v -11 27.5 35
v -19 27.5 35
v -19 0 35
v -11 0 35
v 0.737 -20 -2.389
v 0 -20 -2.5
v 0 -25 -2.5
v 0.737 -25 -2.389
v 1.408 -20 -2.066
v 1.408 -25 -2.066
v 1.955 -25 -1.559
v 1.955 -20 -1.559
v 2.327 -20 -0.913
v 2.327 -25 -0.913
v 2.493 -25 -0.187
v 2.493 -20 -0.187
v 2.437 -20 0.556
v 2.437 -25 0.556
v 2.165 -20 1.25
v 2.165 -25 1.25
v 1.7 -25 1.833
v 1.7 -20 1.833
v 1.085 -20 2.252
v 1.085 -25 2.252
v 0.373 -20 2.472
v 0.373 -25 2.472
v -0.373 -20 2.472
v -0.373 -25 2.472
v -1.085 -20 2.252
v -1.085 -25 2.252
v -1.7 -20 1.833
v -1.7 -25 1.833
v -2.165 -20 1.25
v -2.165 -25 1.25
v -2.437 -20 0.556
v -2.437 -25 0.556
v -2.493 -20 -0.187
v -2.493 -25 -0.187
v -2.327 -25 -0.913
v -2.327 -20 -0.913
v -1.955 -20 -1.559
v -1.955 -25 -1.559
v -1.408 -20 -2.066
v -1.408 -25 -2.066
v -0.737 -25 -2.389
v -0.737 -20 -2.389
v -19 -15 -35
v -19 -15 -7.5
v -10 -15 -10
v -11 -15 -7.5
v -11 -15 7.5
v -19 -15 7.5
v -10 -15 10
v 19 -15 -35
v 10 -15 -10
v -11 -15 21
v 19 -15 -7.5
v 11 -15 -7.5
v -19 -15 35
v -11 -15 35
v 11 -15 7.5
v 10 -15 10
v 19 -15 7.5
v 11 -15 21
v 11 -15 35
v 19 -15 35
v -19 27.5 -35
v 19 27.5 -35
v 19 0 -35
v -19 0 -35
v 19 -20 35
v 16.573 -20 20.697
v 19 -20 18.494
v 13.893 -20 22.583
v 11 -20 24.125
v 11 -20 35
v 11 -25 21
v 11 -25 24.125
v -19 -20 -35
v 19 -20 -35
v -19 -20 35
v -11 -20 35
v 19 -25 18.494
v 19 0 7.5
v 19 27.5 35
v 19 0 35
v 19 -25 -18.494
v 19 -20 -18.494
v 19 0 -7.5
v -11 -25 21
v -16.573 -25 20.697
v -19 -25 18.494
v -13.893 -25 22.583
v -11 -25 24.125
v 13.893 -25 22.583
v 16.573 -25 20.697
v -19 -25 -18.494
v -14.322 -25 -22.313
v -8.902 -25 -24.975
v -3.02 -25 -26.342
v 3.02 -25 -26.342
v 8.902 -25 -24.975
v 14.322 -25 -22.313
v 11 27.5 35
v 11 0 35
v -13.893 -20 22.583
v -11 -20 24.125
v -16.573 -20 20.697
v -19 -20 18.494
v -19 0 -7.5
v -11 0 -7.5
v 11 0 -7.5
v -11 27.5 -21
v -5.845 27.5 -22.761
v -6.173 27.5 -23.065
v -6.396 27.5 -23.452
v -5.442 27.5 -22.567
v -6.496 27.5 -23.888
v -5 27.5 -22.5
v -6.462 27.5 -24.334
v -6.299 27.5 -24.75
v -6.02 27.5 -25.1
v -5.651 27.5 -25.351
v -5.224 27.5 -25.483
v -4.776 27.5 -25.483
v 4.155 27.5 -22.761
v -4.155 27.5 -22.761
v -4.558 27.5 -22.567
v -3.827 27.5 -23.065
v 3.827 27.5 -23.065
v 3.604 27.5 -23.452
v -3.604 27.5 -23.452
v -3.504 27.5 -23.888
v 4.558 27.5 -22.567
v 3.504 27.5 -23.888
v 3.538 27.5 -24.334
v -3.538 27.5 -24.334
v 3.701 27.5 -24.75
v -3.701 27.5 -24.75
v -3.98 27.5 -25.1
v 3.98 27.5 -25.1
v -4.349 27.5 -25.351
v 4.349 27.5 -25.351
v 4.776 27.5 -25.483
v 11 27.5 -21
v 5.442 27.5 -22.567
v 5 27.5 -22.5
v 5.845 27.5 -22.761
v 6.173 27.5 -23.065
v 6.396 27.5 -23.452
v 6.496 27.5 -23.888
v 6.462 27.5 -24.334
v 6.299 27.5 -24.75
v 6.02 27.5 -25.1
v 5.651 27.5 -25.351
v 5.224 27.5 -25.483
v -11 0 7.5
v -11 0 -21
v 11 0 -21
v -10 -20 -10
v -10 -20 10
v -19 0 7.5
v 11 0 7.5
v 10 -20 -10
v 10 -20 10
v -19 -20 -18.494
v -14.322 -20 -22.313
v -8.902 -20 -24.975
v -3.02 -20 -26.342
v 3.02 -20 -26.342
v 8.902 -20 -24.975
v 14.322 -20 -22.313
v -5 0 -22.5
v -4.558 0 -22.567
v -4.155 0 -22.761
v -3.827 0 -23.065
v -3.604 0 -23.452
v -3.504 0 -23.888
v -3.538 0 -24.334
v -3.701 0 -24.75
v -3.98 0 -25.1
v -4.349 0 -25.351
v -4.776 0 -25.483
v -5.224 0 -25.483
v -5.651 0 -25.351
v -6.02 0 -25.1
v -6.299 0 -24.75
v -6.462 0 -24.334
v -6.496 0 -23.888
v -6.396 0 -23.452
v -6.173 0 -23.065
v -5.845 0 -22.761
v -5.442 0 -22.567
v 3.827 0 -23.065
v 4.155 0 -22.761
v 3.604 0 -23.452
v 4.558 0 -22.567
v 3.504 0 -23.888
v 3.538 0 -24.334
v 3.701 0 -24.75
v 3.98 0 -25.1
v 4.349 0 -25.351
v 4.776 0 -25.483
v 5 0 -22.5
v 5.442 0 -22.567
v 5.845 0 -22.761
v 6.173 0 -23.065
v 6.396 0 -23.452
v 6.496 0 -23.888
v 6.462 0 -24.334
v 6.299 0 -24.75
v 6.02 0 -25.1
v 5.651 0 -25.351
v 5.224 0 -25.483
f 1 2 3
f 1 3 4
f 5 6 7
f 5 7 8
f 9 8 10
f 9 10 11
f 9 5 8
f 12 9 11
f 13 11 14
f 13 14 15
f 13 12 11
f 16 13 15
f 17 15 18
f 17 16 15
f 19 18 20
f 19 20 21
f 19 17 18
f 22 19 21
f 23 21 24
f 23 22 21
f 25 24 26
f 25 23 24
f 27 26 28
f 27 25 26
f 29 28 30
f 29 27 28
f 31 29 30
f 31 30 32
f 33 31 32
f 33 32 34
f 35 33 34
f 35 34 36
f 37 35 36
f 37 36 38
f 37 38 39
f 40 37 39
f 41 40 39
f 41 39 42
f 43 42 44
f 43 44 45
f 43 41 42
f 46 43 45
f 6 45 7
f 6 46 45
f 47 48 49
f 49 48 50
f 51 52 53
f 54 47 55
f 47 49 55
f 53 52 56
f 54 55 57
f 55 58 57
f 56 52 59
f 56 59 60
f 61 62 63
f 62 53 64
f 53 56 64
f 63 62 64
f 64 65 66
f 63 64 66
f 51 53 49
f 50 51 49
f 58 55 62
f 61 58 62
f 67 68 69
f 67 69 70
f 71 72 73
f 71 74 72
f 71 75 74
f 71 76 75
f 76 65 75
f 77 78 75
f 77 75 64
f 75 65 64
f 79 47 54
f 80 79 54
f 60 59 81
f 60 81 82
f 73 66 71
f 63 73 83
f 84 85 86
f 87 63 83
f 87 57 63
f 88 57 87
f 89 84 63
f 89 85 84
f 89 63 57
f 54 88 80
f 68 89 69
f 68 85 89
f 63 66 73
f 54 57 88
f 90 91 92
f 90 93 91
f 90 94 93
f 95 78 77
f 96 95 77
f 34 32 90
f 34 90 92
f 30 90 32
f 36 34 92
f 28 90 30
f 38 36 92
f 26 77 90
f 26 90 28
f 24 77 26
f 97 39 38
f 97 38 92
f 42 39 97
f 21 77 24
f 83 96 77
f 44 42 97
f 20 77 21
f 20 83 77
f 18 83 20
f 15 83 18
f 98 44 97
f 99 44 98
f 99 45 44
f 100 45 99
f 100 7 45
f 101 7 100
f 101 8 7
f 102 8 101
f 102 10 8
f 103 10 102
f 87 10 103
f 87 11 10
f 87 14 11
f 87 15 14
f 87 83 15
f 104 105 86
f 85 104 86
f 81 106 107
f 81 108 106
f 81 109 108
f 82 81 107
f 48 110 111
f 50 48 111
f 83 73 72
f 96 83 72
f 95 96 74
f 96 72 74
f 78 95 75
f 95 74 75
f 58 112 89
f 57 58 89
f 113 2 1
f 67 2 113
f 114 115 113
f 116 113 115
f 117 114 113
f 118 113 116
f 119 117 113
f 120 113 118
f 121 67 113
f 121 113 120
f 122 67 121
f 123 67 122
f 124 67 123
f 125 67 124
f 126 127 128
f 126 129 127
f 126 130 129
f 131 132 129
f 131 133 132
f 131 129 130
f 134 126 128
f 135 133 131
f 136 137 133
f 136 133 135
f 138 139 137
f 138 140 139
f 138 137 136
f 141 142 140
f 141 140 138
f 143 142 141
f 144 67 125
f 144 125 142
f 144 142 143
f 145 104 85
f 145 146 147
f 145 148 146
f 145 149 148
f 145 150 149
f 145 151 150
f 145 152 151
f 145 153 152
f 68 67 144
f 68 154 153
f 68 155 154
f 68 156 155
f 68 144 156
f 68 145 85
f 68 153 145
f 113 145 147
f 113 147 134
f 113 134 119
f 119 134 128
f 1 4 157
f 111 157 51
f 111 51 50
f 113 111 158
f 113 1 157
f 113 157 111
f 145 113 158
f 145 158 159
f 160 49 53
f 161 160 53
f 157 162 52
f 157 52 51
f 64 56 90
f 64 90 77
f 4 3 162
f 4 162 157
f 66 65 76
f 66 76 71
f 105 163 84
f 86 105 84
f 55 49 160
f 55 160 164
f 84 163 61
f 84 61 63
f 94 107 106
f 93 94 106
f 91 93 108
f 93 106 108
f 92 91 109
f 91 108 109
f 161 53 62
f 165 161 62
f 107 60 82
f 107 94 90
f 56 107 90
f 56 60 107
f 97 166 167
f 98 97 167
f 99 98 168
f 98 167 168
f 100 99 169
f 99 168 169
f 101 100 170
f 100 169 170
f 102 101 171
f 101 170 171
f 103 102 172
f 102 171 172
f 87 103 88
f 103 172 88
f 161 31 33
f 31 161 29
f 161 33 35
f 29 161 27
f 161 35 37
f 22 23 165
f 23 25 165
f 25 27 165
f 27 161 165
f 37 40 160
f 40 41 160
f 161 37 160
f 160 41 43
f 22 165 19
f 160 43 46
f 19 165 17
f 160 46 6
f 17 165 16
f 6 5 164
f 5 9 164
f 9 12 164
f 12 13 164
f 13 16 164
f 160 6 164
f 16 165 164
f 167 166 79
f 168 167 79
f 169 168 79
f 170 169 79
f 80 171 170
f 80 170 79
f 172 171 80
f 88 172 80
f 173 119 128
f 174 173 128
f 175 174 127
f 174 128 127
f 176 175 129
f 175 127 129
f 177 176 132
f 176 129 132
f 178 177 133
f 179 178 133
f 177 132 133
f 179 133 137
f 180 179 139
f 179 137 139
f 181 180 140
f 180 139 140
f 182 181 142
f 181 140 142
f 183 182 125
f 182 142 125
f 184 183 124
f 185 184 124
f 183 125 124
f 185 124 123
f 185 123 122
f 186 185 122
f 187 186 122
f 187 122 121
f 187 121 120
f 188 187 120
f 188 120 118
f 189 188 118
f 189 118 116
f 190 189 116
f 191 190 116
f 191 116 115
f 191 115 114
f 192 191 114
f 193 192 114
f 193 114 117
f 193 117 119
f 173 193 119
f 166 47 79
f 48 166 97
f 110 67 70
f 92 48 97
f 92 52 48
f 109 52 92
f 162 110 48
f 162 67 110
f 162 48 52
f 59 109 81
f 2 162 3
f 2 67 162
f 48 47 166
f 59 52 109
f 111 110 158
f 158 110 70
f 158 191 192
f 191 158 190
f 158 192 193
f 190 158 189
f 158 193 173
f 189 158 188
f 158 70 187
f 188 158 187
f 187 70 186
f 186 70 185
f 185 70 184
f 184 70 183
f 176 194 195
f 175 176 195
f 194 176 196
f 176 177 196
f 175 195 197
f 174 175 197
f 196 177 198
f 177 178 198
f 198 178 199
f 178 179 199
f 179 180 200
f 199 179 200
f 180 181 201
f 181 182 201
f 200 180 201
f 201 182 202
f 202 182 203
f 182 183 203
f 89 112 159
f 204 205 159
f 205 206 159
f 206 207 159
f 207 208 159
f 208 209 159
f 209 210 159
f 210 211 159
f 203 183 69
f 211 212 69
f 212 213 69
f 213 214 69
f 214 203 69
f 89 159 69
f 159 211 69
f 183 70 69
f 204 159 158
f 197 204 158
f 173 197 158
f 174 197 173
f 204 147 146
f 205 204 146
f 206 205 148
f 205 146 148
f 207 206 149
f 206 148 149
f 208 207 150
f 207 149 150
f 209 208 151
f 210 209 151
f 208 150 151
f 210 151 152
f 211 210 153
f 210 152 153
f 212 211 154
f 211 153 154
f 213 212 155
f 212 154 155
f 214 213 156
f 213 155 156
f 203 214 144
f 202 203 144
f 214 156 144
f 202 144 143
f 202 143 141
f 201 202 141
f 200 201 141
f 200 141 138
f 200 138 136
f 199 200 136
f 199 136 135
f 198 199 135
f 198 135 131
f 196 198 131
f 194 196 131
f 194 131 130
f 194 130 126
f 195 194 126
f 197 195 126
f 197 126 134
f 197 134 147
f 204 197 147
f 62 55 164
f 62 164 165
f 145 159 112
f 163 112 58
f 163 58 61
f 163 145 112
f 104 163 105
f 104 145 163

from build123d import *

# Parameters (mm, degrees)
SKETCH1_W           = 90
SKETCH1_H           = 70
BOSS_EXTRUDE1_DEPTH = 12.5
SKETCH3_W           = 90
SKETCH3_H           = 15
BOSS_EXTRUDE2_DEPTH = 15
SKETCH4_R           = 1.25
SKETCH4_W           = 22
SKETCH4_H           = 42
CUT_EXTRUDE1_DEPTH  = 64.294944506
SKETCH7_W           = 90
SKETCH7_H           = 70
SKETCH7_W_2         = 20
SKETCH7_H_2         = 20
BOSS_EXTRUDE3_DEPTH = 5
SKETCH8_R           = 26.514354508
SKETCH8_R_2         = 2.5
BOSS_EXTRUDE4_DEPTH = 5
SKETCH12_W          = 22
SKETCH12_H          = 14
CUT_EXTRUDE3_DEPTH  = 69.23672032
SKETCH16_W          = 26
SKETCH16_H          = 70
CUT_EXTRUDE5_DEPTH  = 69.23672032
BOSS_EXTRUDE5_START = 15
SKETCH17_R          = 1.25
BOSS_EXTRUDE5_DEPTH = 15
SKETCH18_R          = 1.5
CUT_EXTRUDE6_DEPTH  = 30


with BuildPart() as part:
    # Sketch1 → Boss-Extrude1 (new body)
    with BuildSketch(Plane(origin=(0, 0, 0), x_dir=(1, 0, 0), z_dir=(0, 1, 0))):
        Rectangle(SKETCH1_W, SKETCH1_H)
    extrude(amount=BOSS_EXTRUDE1_DEPTH)

    # Sketch3 → Boss-Extrude2 (add)
    with BuildSketch(Plane.XZ):
        Rectangle(SKETCH3_W, SKETCH3_H)
    extrude(amount=BOSS_EXTRUDE2_DEPTH)

    # Sketch4 → Cut-Extrude1 (cut, through all)
    with BuildSketch(Plane(origin=(0, 12.5, 0), x_dir=(1, 0, 0), z_dir=(0, 1, 0))):
        with Locations(Location((-5, 24, 0), (0, 0, 270))):
            Circle(SKETCH4_R)
        with Locations(Location((5, 24, 0), (0, 0, 270))):
            Circle(SKETCH4_R)
        with Locations(Location((5, -24, 0), (0, 0, 270))):
            Circle(SKETCH4_R)
        with Locations(Location((-5, -24, 0), (0, 0, 270))):
            Circle(SKETCH4_R)
        Rectangle(SKETCH4_W, SKETCH4_H)
    extrude(amount=-CUT_EXTRUDE1_DEPTH, mode=Mode.SUBTRACT)

    # Sketch7 → Boss-Extrude3 (add)
    with BuildSketch(Plane.XZ.offset(15)):
        Rectangle(SKETCH7_W, SKETCH7_H)
        Rectangle(SKETCH7_W_2, SKETCH7_H_2, mode=Mode.SUBTRACT)
    extrude(amount=BOSS_EXTRUDE3_DEPTH)

    # Sketch8 → Boss-Extrude4 (add)
    with BuildSketch(Plane.XZ.offset(20)):
        with Locations(Location((0, 0, 0), (0, 0, 270))):
            Circle(SKETCH8_R)
        with Locations(Location((0, 0, 0), (0, 0, 270))):
            Circle(SKETCH8_R_2, mode=Mode.SUBTRACT)
    extrude(amount=BOSS_EXTRUDE4_DEPTH)

    # Sketch12 → Cut-Extrude3 (cut, through all)
    with BuildSketch(Plane(origin=(0, 12.5, 0), x_dir=(1, 0, 0), z_dir=(0, 1, 0))):
        with Locations((0, -28)):
            Rectangle(SKETCH12_W, SKETCH12_H)
    extrude(amount=-CUT_EXTRUDE3_DEPTH, mode=Mode.SUBTRACT)

    # Sketch16 → Cut-Extrude5 (cut, through all)
    with BuildSketch(Plane(origin=(0, 12.5, 0), x_dir=(1, 0, 0), z_dir=(0, 1, 0))):
        with Locations((-32, 0)):
            Rectangle(SKETCH16_W, SKETCH16_H)
        with Locations((32, 0)):
            Rectangle(SKETCH16_W, SKETCH16_H)
    extrude(amount=-CUT_EXTRUDE5_DEPTH, mode=Mode.SUBTRACT)

    # Sketch17 → Boss-Extrude5 (add)
    with BuildSketch(Plane(origin=(0, 12.5, 0), x_dir=(1, 0, 0), z_dir=(0, 1, 0)).offset(BOSS_EXTRUDE5_START)):
        Polygon((19, 35), (-19, 35), (-19, -35), (-11, -35), (-11, 21), (11, 21), (11, -35), (19, -35), align=None)
        with Locations(Location((5, 24, 0), (0, 0, 270))):
            Circle(SKETCH17_R, mode=Mode.SUBTRACT)
        with Locations(Location((-5, 24, 0), (0, 0, 270))):
            Circle(SKETCH17_R, mode=Mode.SUBTRACT)
    extrude(amount=-BOSS_EXTRUDE5_DEPTH)

    # Sketch18 → Cut-Extrude6 (cut)
    with BuildSketch(Plane(origin=(0, 27.5, 0), x_dir=(1, 0, 0), z_dir=(0, 1, 0))):
        with Locations(Location((-5, 24, 0), (0, 0, 270))):
            Circle(SKETCH18_R)
        with Locations(Location((5, 24, 0), (0, 0, 270))):
            Circle(SKETCH18_R)
    extrude(amount=-CUT_EXTRUDE6_DEPTH, mode=Mode.SUBTRACT)


solid = part.part
